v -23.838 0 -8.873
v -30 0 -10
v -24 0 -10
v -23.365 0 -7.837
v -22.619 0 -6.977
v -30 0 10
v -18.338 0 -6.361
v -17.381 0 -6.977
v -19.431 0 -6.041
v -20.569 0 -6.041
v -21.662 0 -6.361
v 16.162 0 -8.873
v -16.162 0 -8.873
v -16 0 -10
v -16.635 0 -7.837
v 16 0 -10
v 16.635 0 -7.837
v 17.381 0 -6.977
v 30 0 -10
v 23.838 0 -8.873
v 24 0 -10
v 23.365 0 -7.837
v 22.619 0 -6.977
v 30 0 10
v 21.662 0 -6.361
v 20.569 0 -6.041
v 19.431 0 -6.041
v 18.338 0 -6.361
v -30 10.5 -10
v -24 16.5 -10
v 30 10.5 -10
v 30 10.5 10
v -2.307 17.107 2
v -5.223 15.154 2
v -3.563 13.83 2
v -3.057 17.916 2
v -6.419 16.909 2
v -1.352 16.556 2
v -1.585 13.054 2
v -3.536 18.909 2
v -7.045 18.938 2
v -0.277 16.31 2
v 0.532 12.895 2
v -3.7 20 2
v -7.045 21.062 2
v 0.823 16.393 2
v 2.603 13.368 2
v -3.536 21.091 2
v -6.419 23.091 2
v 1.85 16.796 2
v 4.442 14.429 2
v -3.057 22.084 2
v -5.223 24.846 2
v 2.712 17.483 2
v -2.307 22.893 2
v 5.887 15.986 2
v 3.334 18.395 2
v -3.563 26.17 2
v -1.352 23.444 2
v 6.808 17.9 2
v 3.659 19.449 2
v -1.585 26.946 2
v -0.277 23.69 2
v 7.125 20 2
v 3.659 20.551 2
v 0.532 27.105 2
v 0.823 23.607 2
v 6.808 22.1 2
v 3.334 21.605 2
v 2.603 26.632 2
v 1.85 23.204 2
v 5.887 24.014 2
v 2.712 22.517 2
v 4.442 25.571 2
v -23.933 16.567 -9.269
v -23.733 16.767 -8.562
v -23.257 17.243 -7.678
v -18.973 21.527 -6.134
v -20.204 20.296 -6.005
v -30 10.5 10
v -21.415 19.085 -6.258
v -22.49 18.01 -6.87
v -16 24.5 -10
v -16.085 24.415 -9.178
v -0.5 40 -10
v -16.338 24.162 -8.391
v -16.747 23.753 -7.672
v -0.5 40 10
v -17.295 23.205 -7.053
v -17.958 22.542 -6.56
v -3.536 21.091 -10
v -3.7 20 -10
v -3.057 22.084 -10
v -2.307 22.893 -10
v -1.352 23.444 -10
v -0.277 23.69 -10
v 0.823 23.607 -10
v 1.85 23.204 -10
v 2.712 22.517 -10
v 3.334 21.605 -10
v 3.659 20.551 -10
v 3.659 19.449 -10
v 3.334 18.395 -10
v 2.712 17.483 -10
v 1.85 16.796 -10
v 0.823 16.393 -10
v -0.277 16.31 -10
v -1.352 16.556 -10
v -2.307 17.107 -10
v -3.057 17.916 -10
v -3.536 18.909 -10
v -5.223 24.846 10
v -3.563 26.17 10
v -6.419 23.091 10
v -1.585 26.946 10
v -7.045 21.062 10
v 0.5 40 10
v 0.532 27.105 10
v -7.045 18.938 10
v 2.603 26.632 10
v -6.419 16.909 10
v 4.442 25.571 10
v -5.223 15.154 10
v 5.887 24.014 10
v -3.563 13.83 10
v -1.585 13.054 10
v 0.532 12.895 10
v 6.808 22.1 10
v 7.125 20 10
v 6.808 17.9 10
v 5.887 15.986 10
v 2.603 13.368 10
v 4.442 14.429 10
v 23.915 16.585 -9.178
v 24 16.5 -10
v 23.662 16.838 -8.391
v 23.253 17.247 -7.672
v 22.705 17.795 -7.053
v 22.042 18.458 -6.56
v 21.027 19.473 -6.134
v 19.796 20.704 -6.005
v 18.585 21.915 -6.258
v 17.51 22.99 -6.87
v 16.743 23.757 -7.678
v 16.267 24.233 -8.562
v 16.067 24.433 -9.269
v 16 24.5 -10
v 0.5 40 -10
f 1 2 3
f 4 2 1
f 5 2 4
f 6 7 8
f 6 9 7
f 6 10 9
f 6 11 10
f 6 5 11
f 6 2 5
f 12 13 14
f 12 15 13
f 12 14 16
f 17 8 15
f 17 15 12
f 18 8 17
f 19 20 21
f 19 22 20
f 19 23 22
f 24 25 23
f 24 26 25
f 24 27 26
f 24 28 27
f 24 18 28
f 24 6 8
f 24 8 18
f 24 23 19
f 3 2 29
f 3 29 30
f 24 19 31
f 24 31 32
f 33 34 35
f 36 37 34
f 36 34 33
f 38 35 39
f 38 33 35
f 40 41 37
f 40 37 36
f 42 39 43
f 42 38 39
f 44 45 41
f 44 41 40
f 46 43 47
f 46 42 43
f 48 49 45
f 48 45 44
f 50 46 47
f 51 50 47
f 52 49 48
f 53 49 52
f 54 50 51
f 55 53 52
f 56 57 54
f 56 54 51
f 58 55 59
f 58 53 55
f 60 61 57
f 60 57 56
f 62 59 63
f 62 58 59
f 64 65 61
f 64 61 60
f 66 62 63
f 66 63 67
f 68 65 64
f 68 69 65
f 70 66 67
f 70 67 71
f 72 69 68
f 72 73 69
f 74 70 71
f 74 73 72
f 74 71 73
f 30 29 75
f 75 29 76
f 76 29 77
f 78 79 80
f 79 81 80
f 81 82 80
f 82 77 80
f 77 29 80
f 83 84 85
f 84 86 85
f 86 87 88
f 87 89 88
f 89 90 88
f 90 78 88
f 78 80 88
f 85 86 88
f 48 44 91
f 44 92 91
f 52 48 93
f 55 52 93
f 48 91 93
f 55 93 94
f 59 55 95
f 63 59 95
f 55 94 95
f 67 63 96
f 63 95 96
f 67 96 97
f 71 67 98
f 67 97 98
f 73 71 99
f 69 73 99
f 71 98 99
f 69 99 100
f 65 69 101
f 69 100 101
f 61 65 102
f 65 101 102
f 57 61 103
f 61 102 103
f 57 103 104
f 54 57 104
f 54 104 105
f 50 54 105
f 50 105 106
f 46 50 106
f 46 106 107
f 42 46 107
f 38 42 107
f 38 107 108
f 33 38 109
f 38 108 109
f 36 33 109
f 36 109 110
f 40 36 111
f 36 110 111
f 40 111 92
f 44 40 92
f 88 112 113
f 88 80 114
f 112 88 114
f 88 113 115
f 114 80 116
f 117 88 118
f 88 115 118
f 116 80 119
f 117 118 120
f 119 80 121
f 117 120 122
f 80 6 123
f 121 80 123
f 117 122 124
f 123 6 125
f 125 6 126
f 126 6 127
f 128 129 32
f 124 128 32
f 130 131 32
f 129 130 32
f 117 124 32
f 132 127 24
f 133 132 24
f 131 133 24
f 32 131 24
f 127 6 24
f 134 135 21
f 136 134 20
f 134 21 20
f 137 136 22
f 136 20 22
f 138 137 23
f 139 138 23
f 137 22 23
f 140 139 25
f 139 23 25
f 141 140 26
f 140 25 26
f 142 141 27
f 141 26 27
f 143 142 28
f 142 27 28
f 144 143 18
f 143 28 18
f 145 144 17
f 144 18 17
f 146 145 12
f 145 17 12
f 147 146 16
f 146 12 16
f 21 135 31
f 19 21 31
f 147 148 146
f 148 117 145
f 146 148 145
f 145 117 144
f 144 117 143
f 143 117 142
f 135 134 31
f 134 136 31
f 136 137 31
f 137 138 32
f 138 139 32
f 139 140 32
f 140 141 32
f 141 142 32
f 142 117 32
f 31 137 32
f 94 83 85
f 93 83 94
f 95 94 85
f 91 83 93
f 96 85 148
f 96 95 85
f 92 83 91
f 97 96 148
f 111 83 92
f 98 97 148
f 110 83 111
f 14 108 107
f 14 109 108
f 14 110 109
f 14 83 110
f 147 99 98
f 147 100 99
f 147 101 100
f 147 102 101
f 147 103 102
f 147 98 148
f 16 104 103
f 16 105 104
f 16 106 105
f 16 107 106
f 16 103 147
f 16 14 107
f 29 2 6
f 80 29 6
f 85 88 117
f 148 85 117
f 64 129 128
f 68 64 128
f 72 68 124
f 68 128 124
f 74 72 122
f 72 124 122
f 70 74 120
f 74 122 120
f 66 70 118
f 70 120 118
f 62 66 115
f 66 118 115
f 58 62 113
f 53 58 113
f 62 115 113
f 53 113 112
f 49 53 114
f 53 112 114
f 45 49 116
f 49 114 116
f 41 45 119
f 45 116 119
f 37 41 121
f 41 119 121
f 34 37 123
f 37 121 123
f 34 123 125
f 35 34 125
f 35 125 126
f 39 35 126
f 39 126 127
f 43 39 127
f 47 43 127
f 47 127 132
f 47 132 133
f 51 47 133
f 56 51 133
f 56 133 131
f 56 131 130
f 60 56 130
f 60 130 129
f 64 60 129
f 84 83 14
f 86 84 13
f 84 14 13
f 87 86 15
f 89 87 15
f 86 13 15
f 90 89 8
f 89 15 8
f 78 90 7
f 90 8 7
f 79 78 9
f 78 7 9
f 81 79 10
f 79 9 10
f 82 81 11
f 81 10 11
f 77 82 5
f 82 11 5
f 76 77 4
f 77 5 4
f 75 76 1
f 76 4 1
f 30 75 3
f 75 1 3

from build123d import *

# Parameters (mm, degrees)
F0_W           = 60
F0_H           = 20
F1_DEPTH       = 40
F3_DEPTH       = 20.001
F4_R           = 4
F5_DEPTH       = 40.001
F7_D           = 7.4
F7_DEPTH       = 30
F7_CBORE_D     = 14.25
F7_CBORE_DEPTH = 8
F7_TIP         = 2.2231842904


with BuildPart() as f1:
    # F0 (on Front) → F1 (new body)
    with BuildSketch(Plane.XZ):
        Rectangle(F0_W, F0_H)
    extrude(amount=-F1_DEPTH)

    # F2 (on face) → F3 (cut, through all)
    with BuildSketch(Plane.XY.offset(10)):
        Polygon((-30, 10.5), (-0.5, 40), (-30, 40), align=None)
        Polygon((30, 40), (0.5, 40), (30, 10.5), align=None)
    extrude(amount=-F3_DEPTH, mode=Mode.SUBTRACT)

    # F4 (on face) → F5 (cut, through all)
    with BuildSketch(Plane.XZ):
        with Locations((-20, -10)):
            Circle(F4_R)
        with Locations((20, -10)):
            Circle(F4_R)
    extrude(amount=-F5_DEPTH, mode=Mode.SUBTRACT)

    # F7
    with Locations(Plane.XY.offset(10)):
        with Locations((0, 20)):
            CounterBoreHole(F7_D / 2, F7_CBORE_D / 2, F7_CBORE_DEPTH, depth=F7_DEPTH)
            with Locations((0, 0, -(F7_DEPTH + F7_TIP / 2))):  # 118° drill point
                Cone(0, F7_D / 2, F7_TIP, mode=Mode.SUBTRACT)


solid = f1.part
